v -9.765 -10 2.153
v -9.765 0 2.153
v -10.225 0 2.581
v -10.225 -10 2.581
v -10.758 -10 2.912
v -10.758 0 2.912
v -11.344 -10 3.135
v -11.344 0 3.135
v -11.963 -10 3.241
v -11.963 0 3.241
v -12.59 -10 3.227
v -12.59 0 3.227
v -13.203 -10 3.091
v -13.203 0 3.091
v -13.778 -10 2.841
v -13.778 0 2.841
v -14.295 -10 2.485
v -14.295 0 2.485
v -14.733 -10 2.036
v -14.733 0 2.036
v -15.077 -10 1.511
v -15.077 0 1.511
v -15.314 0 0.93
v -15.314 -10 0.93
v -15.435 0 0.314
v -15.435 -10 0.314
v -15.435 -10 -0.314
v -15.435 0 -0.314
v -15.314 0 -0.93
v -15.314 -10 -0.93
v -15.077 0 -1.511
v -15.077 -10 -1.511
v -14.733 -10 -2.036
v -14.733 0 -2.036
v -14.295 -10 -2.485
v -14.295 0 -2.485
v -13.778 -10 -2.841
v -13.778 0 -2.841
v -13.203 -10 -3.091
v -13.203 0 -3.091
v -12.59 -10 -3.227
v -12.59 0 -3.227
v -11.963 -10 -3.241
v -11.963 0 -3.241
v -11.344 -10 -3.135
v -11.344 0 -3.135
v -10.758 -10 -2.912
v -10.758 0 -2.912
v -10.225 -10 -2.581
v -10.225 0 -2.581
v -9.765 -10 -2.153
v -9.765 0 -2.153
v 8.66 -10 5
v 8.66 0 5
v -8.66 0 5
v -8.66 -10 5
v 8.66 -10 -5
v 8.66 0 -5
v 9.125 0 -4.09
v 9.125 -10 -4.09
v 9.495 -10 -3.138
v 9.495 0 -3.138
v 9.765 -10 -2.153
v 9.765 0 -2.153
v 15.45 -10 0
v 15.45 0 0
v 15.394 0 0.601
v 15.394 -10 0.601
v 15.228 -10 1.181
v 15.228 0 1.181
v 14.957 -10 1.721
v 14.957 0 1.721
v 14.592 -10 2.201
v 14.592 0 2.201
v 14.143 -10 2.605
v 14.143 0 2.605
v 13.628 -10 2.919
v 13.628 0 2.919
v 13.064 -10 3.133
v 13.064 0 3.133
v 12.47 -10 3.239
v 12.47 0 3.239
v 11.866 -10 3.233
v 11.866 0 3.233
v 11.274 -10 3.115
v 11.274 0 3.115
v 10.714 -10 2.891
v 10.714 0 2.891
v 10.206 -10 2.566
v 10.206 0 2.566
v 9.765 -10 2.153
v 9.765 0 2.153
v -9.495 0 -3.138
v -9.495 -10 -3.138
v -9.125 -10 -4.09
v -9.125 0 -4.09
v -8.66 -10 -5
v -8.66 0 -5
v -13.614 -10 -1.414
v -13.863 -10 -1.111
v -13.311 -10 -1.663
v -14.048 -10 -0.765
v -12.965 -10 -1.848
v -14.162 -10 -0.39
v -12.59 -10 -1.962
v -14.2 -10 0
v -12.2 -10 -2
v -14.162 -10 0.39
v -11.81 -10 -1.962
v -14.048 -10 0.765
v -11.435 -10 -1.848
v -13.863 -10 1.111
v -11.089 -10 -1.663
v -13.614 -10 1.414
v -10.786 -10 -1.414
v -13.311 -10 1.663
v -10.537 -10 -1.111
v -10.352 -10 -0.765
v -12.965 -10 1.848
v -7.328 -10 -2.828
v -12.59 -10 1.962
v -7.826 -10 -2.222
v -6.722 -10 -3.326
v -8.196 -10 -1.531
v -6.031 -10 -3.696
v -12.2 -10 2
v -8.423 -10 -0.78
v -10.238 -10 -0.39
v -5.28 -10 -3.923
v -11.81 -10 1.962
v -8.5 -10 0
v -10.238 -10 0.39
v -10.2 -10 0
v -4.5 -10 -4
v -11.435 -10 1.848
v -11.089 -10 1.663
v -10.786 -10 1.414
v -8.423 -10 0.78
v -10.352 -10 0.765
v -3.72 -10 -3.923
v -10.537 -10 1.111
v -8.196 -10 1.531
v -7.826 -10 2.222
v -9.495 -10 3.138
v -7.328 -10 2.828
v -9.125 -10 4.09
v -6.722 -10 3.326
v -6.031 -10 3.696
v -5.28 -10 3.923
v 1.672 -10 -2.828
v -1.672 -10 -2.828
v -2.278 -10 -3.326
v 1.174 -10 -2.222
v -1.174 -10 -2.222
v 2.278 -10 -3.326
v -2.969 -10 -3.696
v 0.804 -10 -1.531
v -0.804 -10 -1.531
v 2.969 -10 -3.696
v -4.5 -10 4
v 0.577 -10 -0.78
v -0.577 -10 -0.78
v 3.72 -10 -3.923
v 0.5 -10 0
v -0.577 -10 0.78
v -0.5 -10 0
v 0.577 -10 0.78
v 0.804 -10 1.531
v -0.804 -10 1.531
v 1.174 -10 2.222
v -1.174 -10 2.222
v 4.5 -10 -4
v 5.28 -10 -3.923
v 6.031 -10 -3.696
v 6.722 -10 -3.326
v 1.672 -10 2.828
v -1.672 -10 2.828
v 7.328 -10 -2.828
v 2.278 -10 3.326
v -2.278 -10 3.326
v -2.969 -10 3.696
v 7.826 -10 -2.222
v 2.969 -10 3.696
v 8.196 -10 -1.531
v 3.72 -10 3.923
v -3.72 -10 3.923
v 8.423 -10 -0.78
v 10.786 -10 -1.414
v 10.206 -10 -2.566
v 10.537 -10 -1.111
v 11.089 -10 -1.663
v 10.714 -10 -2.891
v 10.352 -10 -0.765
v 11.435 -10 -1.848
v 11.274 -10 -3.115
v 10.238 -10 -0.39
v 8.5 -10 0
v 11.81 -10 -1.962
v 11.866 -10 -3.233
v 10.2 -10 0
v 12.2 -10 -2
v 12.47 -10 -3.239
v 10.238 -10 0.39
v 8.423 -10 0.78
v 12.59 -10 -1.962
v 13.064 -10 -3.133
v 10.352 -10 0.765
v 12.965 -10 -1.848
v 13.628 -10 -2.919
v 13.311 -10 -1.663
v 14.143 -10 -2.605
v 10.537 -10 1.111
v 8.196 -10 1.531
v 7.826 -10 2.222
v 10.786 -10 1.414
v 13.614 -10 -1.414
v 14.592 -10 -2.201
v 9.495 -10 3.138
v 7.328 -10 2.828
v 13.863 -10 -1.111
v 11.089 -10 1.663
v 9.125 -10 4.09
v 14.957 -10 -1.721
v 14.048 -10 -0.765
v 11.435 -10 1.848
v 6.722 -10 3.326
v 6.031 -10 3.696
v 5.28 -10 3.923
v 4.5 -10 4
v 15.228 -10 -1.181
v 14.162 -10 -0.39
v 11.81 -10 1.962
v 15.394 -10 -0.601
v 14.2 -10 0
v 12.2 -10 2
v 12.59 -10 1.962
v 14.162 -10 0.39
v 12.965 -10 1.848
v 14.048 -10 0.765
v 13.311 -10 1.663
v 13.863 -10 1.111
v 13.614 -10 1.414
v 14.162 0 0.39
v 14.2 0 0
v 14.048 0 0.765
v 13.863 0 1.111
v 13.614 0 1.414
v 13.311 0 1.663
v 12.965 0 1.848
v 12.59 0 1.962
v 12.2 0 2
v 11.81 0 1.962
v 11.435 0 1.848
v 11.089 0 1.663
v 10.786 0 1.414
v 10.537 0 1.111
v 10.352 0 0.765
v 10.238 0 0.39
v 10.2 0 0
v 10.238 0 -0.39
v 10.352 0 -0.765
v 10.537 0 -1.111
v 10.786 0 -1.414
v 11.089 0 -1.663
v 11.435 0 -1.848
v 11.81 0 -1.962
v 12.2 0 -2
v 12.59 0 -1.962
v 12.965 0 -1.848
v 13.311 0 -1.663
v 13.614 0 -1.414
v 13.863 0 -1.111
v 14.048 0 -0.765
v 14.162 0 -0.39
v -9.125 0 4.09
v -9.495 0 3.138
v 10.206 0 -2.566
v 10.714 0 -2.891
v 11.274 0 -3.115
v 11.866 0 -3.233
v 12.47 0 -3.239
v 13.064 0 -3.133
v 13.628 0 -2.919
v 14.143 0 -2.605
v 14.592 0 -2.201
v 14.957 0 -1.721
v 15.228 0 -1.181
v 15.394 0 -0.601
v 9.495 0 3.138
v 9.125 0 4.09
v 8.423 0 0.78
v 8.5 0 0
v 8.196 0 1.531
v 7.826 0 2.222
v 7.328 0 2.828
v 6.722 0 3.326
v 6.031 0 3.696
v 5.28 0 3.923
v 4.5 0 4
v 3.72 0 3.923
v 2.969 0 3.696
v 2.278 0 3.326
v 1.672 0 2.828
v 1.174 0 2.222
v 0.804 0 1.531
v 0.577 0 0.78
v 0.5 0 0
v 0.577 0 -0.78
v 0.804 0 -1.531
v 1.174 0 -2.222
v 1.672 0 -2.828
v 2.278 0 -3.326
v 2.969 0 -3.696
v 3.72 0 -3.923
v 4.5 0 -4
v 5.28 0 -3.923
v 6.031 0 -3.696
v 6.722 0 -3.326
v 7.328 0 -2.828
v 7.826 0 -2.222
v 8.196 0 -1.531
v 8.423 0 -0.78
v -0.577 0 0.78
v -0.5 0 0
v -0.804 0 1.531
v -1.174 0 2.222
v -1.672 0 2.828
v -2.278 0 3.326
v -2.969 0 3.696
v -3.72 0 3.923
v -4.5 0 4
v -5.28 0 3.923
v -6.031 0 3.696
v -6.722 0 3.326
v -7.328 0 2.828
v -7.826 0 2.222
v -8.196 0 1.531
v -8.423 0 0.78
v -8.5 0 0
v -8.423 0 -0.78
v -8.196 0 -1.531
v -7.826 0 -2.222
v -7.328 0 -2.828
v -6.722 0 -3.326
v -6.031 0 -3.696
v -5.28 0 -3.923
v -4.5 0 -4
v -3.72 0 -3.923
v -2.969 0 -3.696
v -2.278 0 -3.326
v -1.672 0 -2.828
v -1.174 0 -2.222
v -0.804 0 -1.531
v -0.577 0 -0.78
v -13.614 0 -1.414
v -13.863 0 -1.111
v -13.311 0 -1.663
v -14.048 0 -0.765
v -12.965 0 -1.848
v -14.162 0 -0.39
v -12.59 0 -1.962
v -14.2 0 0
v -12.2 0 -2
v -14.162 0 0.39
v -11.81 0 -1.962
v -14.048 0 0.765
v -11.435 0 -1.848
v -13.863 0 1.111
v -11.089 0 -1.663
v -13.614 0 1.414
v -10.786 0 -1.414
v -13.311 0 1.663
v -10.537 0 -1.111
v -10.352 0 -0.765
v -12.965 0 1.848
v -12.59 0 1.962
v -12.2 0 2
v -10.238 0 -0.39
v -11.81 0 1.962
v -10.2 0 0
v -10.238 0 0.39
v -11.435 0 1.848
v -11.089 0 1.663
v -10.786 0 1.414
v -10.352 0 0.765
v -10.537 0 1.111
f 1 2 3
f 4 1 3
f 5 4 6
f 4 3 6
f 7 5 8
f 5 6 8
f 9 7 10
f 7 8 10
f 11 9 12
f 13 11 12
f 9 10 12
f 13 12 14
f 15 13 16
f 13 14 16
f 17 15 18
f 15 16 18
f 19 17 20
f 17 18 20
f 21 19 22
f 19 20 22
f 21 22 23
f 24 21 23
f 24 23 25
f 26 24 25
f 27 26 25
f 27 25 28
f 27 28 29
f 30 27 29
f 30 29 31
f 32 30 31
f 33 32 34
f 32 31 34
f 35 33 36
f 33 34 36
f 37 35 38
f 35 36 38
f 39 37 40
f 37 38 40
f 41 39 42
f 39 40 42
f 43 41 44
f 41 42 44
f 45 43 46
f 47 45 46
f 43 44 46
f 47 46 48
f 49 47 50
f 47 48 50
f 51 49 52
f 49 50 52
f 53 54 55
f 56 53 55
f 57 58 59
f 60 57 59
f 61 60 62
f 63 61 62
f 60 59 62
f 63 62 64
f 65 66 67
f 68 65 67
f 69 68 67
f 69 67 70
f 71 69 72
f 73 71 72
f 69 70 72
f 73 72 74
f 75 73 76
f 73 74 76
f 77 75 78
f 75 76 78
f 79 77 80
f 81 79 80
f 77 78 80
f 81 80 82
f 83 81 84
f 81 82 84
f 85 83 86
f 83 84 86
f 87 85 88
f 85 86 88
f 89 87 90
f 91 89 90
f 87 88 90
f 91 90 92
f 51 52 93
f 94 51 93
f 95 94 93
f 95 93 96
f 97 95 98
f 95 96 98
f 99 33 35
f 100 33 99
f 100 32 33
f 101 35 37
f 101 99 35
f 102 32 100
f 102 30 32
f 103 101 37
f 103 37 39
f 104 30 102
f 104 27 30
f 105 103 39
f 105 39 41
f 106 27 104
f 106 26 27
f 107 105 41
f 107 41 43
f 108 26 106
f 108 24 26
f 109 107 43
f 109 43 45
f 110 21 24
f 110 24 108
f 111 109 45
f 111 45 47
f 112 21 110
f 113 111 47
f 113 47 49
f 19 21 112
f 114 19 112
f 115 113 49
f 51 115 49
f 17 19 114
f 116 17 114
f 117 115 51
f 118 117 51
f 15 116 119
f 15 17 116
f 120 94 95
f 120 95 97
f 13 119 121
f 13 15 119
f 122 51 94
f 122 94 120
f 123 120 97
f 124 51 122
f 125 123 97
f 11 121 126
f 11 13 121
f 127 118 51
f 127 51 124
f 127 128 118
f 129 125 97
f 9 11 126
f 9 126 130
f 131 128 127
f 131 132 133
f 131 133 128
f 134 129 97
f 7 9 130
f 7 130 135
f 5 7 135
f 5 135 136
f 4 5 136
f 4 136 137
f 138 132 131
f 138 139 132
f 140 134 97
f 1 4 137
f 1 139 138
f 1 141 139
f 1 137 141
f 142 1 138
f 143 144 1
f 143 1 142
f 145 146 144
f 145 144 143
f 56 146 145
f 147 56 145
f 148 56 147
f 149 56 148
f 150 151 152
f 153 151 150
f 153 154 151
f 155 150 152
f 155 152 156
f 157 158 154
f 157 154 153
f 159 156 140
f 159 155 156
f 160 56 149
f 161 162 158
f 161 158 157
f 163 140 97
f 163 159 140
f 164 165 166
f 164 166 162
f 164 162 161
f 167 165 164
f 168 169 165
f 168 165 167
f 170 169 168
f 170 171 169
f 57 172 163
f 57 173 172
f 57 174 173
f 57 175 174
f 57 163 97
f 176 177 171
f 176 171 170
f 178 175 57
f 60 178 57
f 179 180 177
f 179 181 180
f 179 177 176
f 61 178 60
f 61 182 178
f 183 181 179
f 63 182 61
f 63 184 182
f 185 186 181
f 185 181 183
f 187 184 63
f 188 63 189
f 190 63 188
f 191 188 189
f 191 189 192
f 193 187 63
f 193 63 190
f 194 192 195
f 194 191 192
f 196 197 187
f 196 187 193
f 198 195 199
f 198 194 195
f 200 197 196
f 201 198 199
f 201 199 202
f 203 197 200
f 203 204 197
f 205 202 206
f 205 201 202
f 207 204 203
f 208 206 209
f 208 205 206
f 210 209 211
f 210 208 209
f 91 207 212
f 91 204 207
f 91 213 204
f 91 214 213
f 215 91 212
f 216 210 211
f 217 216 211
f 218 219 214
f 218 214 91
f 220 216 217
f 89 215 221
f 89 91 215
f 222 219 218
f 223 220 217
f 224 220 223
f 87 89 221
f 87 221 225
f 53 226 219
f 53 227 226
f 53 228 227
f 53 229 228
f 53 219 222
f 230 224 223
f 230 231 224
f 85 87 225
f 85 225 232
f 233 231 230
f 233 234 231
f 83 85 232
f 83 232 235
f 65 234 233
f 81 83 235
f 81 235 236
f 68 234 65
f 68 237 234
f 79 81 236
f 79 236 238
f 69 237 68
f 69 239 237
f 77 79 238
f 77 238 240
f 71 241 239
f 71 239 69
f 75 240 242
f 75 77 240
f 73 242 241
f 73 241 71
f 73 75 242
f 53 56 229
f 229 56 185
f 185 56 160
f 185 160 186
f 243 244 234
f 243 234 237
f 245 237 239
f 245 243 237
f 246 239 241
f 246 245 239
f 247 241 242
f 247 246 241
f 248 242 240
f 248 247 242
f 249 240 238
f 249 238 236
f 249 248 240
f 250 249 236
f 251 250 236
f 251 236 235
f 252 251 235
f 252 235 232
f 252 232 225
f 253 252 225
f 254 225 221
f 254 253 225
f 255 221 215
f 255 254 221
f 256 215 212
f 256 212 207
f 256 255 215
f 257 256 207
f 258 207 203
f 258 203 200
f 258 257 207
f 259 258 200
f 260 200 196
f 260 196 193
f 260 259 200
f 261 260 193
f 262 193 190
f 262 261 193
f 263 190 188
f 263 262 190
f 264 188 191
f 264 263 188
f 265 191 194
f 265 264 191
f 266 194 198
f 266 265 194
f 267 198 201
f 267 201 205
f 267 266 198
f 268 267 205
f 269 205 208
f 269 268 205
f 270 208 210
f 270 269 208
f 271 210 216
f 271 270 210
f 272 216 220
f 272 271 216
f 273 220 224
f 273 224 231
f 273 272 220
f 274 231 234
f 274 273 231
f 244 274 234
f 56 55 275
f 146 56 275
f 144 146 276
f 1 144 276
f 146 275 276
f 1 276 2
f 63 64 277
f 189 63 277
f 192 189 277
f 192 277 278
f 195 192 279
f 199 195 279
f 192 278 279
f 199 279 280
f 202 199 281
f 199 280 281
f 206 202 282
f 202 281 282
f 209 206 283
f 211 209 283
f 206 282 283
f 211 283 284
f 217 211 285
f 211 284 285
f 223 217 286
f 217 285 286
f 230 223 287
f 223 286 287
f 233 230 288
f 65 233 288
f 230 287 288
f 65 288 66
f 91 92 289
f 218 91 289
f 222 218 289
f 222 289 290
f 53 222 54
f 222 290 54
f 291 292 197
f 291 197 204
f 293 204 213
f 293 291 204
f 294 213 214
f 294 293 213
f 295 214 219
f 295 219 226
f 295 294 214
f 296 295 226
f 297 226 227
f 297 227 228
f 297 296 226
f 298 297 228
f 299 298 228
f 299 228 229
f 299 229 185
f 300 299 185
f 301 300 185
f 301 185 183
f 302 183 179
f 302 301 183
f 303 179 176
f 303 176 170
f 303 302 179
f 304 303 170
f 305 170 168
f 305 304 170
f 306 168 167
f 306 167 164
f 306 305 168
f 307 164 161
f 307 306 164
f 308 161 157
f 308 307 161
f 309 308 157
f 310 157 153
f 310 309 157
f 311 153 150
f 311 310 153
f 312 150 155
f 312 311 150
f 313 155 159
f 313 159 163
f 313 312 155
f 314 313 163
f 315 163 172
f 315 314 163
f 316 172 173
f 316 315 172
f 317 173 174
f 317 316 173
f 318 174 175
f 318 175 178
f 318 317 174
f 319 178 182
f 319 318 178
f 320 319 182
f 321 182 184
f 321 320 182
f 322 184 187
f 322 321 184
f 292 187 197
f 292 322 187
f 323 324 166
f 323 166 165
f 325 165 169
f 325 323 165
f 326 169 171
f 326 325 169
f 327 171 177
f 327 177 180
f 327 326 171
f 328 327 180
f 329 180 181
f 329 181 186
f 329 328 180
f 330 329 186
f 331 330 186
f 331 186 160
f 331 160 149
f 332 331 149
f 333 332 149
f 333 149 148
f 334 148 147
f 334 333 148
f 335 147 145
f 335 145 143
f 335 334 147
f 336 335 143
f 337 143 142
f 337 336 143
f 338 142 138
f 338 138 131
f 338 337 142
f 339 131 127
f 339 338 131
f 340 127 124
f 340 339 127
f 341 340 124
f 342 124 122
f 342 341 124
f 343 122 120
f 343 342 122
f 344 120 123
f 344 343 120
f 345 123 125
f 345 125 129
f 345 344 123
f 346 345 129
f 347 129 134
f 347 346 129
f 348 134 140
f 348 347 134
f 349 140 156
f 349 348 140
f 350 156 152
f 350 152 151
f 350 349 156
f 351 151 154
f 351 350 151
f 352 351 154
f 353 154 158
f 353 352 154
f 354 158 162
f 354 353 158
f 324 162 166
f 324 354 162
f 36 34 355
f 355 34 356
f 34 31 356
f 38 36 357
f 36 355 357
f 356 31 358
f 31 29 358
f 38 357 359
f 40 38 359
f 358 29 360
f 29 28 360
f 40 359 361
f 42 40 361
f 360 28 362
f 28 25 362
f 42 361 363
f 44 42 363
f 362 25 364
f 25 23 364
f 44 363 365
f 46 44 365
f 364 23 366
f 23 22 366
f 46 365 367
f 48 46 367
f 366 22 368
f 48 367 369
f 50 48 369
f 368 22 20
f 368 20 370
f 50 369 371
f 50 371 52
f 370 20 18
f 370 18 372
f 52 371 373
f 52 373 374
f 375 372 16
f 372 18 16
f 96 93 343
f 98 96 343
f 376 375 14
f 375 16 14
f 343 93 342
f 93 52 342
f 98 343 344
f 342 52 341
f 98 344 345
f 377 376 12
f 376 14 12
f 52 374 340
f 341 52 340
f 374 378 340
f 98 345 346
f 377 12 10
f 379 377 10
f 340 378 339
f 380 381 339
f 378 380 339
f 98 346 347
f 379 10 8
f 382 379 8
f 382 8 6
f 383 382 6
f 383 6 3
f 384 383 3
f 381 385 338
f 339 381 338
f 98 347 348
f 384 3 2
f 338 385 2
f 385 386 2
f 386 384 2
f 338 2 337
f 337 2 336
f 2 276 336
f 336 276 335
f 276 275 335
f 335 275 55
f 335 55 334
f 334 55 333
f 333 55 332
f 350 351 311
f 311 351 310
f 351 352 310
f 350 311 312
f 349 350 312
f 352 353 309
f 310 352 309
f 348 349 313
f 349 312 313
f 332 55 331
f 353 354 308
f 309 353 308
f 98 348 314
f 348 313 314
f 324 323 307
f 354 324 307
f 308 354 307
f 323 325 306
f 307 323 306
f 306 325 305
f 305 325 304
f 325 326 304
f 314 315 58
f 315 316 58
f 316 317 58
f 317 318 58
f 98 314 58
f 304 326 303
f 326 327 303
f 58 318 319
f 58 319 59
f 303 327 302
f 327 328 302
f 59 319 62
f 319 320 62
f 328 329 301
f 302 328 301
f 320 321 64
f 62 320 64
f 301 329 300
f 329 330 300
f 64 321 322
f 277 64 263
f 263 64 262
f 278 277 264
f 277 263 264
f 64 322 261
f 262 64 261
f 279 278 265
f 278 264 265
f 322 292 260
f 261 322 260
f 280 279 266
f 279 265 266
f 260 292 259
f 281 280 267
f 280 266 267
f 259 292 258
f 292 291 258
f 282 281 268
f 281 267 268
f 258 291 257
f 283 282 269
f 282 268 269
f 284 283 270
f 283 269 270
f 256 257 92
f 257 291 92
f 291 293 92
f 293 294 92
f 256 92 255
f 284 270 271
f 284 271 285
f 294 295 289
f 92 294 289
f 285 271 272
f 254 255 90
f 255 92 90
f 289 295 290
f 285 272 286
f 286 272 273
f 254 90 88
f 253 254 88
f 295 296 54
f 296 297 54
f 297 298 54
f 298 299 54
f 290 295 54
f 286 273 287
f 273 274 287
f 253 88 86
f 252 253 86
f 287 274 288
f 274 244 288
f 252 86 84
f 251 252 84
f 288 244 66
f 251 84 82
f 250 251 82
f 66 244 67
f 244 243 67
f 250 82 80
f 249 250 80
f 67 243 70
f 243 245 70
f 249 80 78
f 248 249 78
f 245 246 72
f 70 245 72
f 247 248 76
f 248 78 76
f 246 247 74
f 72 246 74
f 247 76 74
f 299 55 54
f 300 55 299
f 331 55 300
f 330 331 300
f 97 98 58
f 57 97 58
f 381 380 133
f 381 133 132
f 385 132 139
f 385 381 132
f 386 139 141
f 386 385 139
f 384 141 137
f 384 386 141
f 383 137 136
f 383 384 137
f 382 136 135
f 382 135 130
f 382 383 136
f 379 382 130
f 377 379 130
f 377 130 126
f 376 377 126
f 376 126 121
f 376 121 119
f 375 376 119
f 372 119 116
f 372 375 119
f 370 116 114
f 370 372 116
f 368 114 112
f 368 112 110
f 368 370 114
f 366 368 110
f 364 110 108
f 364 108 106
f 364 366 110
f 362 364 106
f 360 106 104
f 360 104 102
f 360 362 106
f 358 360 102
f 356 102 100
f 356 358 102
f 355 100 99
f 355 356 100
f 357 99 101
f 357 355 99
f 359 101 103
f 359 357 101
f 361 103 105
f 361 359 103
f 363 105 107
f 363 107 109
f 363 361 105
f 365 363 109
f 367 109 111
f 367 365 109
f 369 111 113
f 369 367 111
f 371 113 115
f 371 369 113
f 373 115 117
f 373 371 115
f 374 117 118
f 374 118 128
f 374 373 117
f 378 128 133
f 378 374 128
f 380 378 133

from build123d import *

# Parameters (mm, degrees)
F0_R     = 4
F1_DEPTH = 10
F0_R_2   = 2
F2_DEPTH = 10
F3_DEPTH = 10


with BuildPart() as f1:
    # F0 (on Front) → F1 (new body)
    with BuildSketch(Plane.XZ):
        with BuildLine():
            ThreePointArc((9.7654713115, -2.1530374044), (8.95, 0), (9.7654713115, 2.1530374044))
            ThreePointArc((9.7654713115, 2.1530374044), (9.322185241, 3.618958736), (8.6602540378, 5))
            Line((8.6602540378, 5), (-8.6602540378, 5))
            ThreePointArc((-8.6602540378, 5), (-9.322185241, 3.618958736), (-9.7654713115, 2.1530374044))
            ThreePointArc((-9.7654713115, 2.1530374044), (-9.1606975934, 1.1511476366), (-8.95, 0))
            ThreePointArc((-8.95, 0), (-9.1606975934, -1.1511476366), (-9.7654713115, -2.1530374044))
            ThreePointArc((-9.7654713115, -2.1530374044), (-9.322185241, -3.618958736), (-8.6602540378, -5))
            Line((-8.6602540378, -5), (8.6602540378, -5))
            ThreePointArc((8.6602540378, -5), (9.322185241, -3.618958736), (9.7654713115, -2.1530374044))
        make_face()
        with Locations((-4.5, 0)):
            Circle(F0_R, mode=Mode.SUBTRACT)
        with Locations((4.5, 0)):
            Circle(F0_R, mode=Mode.SUBTRACT)
    extrude(amount=F1_DEPTH)

    # F0 (on Front) → F2 (join)
    with BuildSketch(Plane.XZ):
        with BuildLine():
            ThreePointArc((-9.7654713115, -2.1530374044), (-10, 0), (-9.7654713115, 2.1530374044))
            ThreePointArc((-9.7654713115, 2.1530374044), (-15.45, 0), (-9.7654713115, -2.1530374044))
        make_face()
        with Locations((-12.2, 0)):
            Circle(F0_R_2, mode=Mode.SUBTRACT)
        with BuildLine():
            ThreePointArc((9.7654713115, 2.1530374044), (9.941194926, 1.082886625), (10, 0))
            ThreePointArc((10, 0), (9.941194926, -1.082886625), (9.7654713115, -2.1530374044))
            ThreePointArc((9.7654713115, -2.1530374044), (13.3511476366, -3.0393024066), (15.45, 0))
            ThreePointArc((15.45, 0), (13.3511476366, 3.0393024066), (9.7654713115, 2.1530374044))
        make_face()
        with Locations((12.2, 0)):
            Circle(F0_R_2, mode=Mode.SUBTRACT)
    extrude(amount=F2_DEPTH)

    # F0 (on Front) → F3 (join)
    with BuildSketch(Plane.XZ):
        with BuildLine():
            ThreePointArc((9.7654713115, -2.1530374044), (9.941194926, -1.082886625), (10, 0))
            ThreePointArc((10, 0), (9.941194926, 1.082886625), (9.7654713115, 2.1530374044))
            ThreePointArc((9.7654713115, 2.1530374044), (8.95, 0), (9.7654713115, -2.1530374044))
        make_face()
        with BuildLine():
            ThreePointArc((-8.95, 0), (-9.1606975934, 1.1511476366), (-9.7654713115, 2.1530374044))
            ThreePointArc((-9.7654713115, 2.1530374044), (-10, 0), (-9.7654713115, -2.1530374044))
            ThreePointArc((-9.7654713115, -2.1530374044), (-9.1606975934, -1.1511476366), (-8.95, 0))
        make_face()
    extrude(amount=F3_DEPTH)


solid = f1.part
